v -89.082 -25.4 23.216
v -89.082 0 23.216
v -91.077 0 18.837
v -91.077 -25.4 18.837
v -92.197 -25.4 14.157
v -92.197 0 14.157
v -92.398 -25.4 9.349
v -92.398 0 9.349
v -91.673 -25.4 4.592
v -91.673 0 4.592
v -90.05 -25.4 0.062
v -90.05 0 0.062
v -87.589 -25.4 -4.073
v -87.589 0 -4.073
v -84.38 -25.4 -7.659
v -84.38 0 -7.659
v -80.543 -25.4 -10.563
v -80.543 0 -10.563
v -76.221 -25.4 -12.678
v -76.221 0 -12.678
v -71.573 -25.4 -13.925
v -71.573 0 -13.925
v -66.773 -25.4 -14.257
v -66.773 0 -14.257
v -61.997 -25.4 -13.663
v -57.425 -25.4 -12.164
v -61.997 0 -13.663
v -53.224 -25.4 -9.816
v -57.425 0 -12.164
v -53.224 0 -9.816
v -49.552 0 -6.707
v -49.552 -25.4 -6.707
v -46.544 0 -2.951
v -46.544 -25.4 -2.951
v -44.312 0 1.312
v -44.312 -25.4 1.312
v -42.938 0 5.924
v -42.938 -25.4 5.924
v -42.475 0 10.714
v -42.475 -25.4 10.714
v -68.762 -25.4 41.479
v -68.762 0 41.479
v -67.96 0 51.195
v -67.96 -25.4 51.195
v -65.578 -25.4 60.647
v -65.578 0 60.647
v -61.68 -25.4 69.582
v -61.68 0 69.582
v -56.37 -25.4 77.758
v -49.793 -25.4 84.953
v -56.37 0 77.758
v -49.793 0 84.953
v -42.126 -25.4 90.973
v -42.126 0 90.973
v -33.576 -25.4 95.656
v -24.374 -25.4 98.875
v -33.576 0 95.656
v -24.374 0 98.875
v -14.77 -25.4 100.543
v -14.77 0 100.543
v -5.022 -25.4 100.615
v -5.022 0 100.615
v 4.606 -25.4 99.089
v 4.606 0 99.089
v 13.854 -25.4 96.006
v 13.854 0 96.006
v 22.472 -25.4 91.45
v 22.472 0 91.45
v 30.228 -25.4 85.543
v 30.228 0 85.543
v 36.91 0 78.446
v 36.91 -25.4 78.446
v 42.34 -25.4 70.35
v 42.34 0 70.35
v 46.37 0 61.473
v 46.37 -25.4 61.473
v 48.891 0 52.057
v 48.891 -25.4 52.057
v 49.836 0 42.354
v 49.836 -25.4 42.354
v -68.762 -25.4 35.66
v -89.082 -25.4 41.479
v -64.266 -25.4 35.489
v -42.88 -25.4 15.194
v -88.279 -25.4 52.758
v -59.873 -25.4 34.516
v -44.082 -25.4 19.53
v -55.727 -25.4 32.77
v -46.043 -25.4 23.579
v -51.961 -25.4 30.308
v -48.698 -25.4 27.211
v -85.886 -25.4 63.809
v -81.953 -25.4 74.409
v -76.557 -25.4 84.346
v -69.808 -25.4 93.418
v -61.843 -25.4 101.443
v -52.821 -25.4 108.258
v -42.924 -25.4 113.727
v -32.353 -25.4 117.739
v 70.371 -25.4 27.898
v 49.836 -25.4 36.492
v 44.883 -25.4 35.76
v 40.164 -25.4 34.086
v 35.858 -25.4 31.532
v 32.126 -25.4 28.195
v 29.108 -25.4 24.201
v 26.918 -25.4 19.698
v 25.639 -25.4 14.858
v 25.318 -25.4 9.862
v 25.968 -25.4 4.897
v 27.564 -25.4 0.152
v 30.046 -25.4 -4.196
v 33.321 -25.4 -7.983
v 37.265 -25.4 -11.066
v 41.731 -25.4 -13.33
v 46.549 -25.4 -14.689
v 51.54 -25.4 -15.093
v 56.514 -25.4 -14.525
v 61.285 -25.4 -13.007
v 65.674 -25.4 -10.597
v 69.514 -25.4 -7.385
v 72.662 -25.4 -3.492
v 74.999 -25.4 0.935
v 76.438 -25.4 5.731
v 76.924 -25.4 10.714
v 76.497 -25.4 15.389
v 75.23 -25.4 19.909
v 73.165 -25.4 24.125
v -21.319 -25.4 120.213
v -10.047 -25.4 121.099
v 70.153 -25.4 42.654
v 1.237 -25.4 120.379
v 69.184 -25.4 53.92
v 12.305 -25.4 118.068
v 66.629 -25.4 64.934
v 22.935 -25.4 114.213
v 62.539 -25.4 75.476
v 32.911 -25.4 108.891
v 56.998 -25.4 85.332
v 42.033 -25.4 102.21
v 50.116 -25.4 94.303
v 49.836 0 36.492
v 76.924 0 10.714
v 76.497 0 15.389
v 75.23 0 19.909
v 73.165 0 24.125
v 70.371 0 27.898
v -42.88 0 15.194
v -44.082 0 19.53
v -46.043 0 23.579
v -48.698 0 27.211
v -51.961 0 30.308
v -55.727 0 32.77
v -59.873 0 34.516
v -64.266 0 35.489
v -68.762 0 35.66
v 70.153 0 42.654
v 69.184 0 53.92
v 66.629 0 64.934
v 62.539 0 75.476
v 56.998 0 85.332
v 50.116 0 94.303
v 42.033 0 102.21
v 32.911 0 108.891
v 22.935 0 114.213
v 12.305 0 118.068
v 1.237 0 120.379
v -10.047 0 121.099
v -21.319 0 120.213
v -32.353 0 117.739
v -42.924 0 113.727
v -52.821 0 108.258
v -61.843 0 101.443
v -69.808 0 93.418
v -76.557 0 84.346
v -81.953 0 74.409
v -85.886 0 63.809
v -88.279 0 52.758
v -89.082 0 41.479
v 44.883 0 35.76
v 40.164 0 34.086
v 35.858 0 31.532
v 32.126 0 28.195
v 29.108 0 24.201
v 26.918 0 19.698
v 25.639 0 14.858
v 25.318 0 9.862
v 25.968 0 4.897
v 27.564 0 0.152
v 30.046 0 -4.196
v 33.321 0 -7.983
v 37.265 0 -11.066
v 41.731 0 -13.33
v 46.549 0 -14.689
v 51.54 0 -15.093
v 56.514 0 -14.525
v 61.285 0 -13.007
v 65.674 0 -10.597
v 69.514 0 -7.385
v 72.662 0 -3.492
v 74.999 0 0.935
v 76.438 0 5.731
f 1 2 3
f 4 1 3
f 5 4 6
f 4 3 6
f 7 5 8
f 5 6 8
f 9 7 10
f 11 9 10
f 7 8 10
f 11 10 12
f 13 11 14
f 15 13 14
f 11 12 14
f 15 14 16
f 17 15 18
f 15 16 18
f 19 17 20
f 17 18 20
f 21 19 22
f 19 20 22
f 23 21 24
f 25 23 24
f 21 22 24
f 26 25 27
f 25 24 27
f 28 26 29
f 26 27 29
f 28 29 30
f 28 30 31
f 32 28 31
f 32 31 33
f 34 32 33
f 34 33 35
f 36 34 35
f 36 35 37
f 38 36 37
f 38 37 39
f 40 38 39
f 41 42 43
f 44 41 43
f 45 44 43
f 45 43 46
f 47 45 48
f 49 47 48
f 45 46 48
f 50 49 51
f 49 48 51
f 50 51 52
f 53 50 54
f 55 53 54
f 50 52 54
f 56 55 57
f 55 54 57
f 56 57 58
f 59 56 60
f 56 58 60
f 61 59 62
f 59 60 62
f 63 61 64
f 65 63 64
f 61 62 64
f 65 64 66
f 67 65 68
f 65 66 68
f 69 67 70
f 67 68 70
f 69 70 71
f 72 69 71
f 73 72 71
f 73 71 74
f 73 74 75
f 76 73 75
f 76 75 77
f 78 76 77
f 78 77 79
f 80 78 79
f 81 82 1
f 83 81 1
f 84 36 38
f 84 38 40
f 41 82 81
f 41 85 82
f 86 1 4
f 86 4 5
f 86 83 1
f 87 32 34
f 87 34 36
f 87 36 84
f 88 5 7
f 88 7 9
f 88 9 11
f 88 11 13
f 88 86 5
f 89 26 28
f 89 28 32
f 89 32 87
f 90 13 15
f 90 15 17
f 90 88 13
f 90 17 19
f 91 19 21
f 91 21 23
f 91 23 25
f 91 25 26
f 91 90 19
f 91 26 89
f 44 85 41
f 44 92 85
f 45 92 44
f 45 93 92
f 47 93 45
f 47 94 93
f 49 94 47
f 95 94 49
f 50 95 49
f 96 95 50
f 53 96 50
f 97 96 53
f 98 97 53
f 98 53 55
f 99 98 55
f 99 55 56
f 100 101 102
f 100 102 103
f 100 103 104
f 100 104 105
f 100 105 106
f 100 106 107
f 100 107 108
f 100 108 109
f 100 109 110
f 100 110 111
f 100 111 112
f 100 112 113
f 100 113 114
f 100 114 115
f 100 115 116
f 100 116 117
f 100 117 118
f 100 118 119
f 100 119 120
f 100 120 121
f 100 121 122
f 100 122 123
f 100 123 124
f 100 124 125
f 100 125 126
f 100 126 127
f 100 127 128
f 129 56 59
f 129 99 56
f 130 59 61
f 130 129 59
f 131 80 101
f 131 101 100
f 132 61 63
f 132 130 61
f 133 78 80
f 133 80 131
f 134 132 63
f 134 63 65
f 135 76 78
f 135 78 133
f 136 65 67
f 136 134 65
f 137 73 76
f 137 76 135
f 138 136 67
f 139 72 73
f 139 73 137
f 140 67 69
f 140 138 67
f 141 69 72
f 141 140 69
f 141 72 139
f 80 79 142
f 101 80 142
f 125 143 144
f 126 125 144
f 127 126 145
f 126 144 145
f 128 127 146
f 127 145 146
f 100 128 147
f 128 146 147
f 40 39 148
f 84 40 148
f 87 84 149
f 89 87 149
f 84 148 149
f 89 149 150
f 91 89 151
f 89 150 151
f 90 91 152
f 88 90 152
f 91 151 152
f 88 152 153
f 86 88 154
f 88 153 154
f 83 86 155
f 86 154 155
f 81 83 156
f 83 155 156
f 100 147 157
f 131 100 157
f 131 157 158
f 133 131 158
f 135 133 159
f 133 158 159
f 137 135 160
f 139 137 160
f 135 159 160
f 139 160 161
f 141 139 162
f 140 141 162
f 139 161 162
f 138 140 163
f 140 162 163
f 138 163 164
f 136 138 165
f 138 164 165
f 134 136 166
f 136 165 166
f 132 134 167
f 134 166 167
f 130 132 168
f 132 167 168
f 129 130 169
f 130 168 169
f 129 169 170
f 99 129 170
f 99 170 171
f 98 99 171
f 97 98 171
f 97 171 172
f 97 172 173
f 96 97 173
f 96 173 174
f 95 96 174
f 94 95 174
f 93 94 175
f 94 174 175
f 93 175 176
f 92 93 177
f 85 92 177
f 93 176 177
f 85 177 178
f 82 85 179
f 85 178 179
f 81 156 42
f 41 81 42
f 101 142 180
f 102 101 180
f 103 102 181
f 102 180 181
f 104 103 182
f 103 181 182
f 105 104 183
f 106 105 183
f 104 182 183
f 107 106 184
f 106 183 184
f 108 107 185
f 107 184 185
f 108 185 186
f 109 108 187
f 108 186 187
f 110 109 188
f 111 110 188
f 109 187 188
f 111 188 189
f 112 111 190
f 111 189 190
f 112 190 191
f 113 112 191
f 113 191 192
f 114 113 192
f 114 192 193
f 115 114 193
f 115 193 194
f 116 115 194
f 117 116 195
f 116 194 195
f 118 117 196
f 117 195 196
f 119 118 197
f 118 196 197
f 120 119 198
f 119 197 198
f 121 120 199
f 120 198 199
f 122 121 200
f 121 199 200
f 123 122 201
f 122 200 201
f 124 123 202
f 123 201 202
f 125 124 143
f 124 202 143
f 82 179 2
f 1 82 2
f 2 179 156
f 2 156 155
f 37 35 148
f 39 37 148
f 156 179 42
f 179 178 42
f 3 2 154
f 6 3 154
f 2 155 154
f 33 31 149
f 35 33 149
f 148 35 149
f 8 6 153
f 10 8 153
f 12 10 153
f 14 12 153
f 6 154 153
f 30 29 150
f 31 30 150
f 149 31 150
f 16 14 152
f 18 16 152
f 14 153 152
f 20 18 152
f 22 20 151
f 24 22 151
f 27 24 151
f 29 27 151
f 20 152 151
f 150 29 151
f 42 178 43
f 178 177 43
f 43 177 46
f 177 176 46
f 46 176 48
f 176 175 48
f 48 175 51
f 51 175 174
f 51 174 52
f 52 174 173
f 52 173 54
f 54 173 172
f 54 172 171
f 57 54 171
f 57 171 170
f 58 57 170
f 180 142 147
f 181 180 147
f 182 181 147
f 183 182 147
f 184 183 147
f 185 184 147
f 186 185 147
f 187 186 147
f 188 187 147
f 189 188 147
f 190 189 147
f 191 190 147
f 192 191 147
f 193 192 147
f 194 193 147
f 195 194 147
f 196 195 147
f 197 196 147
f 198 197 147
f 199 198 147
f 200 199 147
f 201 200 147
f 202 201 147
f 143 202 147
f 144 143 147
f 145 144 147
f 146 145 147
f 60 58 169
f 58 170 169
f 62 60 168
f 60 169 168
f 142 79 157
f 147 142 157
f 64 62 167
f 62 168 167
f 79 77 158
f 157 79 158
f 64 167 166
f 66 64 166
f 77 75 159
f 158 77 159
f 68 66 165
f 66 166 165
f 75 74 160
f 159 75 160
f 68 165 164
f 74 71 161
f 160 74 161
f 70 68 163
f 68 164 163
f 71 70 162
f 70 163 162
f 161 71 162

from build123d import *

# Parameters (mm, degrees)
F1_DEPTH = 25.4


with BuildPart() as f1:
    # F0 (on Front) → F1 (new body)
    with BuildSketch(Plane.XZ):
        with BuildLine():
            ThreePointArc((-89.08151, 23.215859), (-73.927081, -13.413316), (-42.474968, 10.713801))
            ThreePointArc((-42.474968, 10.713801), (-50.259571, 28.833407), (-68.761512, 35.659704))
            ThreePointArc((-68.761512, 35.659704), (-80.500818, 32.016689), (-89.08151, 23.215859))
        make_face()
        with BuildLine():
            ThreePointArc((-89.08151, 23.215859), (-80.500818, 32.016689), (-68.761512, 35.659704))
            Line((-68.761512, 35.659704), (-68.761512, 41.479227))
            ThreePointArc((-68.761512, 41.479227), (-9.89729, 100.779416), (49.835637, 42.354366))
            Line((49.835637, 42.354366), (49.835637, 36.492049))
            ThreePointArc((49.835637, 36.492049), (61.077606, 34.522835), (70.371209, 27.897986))
            Line((70.371209, 27.897986), (70.153422, 42.654235))
            ThreePointArc((70.153422, 42.654235), (-10.047229, 121.098861), (-89.08151, 41.479227))
            Line((-89.08151, 41.479227), (-89.08151, 23.215859))
        make_face()
        with BuildLine():
            ThreePointArc((70.371209, 27.897986), (61.077606, 34.522835), (49.835637, 36.492049))
            ThreePointArc((49.835637, 36.492049), (33.320821, -7.982932), (76.923518, 10.713801))
            ThreePointArc((76.923518, 10.713801), (75.229873, 19.909302), (70.371209, 27.897986))
        make_face()
    extrude(amount=F1_DEPTH)


solid = f1.part
